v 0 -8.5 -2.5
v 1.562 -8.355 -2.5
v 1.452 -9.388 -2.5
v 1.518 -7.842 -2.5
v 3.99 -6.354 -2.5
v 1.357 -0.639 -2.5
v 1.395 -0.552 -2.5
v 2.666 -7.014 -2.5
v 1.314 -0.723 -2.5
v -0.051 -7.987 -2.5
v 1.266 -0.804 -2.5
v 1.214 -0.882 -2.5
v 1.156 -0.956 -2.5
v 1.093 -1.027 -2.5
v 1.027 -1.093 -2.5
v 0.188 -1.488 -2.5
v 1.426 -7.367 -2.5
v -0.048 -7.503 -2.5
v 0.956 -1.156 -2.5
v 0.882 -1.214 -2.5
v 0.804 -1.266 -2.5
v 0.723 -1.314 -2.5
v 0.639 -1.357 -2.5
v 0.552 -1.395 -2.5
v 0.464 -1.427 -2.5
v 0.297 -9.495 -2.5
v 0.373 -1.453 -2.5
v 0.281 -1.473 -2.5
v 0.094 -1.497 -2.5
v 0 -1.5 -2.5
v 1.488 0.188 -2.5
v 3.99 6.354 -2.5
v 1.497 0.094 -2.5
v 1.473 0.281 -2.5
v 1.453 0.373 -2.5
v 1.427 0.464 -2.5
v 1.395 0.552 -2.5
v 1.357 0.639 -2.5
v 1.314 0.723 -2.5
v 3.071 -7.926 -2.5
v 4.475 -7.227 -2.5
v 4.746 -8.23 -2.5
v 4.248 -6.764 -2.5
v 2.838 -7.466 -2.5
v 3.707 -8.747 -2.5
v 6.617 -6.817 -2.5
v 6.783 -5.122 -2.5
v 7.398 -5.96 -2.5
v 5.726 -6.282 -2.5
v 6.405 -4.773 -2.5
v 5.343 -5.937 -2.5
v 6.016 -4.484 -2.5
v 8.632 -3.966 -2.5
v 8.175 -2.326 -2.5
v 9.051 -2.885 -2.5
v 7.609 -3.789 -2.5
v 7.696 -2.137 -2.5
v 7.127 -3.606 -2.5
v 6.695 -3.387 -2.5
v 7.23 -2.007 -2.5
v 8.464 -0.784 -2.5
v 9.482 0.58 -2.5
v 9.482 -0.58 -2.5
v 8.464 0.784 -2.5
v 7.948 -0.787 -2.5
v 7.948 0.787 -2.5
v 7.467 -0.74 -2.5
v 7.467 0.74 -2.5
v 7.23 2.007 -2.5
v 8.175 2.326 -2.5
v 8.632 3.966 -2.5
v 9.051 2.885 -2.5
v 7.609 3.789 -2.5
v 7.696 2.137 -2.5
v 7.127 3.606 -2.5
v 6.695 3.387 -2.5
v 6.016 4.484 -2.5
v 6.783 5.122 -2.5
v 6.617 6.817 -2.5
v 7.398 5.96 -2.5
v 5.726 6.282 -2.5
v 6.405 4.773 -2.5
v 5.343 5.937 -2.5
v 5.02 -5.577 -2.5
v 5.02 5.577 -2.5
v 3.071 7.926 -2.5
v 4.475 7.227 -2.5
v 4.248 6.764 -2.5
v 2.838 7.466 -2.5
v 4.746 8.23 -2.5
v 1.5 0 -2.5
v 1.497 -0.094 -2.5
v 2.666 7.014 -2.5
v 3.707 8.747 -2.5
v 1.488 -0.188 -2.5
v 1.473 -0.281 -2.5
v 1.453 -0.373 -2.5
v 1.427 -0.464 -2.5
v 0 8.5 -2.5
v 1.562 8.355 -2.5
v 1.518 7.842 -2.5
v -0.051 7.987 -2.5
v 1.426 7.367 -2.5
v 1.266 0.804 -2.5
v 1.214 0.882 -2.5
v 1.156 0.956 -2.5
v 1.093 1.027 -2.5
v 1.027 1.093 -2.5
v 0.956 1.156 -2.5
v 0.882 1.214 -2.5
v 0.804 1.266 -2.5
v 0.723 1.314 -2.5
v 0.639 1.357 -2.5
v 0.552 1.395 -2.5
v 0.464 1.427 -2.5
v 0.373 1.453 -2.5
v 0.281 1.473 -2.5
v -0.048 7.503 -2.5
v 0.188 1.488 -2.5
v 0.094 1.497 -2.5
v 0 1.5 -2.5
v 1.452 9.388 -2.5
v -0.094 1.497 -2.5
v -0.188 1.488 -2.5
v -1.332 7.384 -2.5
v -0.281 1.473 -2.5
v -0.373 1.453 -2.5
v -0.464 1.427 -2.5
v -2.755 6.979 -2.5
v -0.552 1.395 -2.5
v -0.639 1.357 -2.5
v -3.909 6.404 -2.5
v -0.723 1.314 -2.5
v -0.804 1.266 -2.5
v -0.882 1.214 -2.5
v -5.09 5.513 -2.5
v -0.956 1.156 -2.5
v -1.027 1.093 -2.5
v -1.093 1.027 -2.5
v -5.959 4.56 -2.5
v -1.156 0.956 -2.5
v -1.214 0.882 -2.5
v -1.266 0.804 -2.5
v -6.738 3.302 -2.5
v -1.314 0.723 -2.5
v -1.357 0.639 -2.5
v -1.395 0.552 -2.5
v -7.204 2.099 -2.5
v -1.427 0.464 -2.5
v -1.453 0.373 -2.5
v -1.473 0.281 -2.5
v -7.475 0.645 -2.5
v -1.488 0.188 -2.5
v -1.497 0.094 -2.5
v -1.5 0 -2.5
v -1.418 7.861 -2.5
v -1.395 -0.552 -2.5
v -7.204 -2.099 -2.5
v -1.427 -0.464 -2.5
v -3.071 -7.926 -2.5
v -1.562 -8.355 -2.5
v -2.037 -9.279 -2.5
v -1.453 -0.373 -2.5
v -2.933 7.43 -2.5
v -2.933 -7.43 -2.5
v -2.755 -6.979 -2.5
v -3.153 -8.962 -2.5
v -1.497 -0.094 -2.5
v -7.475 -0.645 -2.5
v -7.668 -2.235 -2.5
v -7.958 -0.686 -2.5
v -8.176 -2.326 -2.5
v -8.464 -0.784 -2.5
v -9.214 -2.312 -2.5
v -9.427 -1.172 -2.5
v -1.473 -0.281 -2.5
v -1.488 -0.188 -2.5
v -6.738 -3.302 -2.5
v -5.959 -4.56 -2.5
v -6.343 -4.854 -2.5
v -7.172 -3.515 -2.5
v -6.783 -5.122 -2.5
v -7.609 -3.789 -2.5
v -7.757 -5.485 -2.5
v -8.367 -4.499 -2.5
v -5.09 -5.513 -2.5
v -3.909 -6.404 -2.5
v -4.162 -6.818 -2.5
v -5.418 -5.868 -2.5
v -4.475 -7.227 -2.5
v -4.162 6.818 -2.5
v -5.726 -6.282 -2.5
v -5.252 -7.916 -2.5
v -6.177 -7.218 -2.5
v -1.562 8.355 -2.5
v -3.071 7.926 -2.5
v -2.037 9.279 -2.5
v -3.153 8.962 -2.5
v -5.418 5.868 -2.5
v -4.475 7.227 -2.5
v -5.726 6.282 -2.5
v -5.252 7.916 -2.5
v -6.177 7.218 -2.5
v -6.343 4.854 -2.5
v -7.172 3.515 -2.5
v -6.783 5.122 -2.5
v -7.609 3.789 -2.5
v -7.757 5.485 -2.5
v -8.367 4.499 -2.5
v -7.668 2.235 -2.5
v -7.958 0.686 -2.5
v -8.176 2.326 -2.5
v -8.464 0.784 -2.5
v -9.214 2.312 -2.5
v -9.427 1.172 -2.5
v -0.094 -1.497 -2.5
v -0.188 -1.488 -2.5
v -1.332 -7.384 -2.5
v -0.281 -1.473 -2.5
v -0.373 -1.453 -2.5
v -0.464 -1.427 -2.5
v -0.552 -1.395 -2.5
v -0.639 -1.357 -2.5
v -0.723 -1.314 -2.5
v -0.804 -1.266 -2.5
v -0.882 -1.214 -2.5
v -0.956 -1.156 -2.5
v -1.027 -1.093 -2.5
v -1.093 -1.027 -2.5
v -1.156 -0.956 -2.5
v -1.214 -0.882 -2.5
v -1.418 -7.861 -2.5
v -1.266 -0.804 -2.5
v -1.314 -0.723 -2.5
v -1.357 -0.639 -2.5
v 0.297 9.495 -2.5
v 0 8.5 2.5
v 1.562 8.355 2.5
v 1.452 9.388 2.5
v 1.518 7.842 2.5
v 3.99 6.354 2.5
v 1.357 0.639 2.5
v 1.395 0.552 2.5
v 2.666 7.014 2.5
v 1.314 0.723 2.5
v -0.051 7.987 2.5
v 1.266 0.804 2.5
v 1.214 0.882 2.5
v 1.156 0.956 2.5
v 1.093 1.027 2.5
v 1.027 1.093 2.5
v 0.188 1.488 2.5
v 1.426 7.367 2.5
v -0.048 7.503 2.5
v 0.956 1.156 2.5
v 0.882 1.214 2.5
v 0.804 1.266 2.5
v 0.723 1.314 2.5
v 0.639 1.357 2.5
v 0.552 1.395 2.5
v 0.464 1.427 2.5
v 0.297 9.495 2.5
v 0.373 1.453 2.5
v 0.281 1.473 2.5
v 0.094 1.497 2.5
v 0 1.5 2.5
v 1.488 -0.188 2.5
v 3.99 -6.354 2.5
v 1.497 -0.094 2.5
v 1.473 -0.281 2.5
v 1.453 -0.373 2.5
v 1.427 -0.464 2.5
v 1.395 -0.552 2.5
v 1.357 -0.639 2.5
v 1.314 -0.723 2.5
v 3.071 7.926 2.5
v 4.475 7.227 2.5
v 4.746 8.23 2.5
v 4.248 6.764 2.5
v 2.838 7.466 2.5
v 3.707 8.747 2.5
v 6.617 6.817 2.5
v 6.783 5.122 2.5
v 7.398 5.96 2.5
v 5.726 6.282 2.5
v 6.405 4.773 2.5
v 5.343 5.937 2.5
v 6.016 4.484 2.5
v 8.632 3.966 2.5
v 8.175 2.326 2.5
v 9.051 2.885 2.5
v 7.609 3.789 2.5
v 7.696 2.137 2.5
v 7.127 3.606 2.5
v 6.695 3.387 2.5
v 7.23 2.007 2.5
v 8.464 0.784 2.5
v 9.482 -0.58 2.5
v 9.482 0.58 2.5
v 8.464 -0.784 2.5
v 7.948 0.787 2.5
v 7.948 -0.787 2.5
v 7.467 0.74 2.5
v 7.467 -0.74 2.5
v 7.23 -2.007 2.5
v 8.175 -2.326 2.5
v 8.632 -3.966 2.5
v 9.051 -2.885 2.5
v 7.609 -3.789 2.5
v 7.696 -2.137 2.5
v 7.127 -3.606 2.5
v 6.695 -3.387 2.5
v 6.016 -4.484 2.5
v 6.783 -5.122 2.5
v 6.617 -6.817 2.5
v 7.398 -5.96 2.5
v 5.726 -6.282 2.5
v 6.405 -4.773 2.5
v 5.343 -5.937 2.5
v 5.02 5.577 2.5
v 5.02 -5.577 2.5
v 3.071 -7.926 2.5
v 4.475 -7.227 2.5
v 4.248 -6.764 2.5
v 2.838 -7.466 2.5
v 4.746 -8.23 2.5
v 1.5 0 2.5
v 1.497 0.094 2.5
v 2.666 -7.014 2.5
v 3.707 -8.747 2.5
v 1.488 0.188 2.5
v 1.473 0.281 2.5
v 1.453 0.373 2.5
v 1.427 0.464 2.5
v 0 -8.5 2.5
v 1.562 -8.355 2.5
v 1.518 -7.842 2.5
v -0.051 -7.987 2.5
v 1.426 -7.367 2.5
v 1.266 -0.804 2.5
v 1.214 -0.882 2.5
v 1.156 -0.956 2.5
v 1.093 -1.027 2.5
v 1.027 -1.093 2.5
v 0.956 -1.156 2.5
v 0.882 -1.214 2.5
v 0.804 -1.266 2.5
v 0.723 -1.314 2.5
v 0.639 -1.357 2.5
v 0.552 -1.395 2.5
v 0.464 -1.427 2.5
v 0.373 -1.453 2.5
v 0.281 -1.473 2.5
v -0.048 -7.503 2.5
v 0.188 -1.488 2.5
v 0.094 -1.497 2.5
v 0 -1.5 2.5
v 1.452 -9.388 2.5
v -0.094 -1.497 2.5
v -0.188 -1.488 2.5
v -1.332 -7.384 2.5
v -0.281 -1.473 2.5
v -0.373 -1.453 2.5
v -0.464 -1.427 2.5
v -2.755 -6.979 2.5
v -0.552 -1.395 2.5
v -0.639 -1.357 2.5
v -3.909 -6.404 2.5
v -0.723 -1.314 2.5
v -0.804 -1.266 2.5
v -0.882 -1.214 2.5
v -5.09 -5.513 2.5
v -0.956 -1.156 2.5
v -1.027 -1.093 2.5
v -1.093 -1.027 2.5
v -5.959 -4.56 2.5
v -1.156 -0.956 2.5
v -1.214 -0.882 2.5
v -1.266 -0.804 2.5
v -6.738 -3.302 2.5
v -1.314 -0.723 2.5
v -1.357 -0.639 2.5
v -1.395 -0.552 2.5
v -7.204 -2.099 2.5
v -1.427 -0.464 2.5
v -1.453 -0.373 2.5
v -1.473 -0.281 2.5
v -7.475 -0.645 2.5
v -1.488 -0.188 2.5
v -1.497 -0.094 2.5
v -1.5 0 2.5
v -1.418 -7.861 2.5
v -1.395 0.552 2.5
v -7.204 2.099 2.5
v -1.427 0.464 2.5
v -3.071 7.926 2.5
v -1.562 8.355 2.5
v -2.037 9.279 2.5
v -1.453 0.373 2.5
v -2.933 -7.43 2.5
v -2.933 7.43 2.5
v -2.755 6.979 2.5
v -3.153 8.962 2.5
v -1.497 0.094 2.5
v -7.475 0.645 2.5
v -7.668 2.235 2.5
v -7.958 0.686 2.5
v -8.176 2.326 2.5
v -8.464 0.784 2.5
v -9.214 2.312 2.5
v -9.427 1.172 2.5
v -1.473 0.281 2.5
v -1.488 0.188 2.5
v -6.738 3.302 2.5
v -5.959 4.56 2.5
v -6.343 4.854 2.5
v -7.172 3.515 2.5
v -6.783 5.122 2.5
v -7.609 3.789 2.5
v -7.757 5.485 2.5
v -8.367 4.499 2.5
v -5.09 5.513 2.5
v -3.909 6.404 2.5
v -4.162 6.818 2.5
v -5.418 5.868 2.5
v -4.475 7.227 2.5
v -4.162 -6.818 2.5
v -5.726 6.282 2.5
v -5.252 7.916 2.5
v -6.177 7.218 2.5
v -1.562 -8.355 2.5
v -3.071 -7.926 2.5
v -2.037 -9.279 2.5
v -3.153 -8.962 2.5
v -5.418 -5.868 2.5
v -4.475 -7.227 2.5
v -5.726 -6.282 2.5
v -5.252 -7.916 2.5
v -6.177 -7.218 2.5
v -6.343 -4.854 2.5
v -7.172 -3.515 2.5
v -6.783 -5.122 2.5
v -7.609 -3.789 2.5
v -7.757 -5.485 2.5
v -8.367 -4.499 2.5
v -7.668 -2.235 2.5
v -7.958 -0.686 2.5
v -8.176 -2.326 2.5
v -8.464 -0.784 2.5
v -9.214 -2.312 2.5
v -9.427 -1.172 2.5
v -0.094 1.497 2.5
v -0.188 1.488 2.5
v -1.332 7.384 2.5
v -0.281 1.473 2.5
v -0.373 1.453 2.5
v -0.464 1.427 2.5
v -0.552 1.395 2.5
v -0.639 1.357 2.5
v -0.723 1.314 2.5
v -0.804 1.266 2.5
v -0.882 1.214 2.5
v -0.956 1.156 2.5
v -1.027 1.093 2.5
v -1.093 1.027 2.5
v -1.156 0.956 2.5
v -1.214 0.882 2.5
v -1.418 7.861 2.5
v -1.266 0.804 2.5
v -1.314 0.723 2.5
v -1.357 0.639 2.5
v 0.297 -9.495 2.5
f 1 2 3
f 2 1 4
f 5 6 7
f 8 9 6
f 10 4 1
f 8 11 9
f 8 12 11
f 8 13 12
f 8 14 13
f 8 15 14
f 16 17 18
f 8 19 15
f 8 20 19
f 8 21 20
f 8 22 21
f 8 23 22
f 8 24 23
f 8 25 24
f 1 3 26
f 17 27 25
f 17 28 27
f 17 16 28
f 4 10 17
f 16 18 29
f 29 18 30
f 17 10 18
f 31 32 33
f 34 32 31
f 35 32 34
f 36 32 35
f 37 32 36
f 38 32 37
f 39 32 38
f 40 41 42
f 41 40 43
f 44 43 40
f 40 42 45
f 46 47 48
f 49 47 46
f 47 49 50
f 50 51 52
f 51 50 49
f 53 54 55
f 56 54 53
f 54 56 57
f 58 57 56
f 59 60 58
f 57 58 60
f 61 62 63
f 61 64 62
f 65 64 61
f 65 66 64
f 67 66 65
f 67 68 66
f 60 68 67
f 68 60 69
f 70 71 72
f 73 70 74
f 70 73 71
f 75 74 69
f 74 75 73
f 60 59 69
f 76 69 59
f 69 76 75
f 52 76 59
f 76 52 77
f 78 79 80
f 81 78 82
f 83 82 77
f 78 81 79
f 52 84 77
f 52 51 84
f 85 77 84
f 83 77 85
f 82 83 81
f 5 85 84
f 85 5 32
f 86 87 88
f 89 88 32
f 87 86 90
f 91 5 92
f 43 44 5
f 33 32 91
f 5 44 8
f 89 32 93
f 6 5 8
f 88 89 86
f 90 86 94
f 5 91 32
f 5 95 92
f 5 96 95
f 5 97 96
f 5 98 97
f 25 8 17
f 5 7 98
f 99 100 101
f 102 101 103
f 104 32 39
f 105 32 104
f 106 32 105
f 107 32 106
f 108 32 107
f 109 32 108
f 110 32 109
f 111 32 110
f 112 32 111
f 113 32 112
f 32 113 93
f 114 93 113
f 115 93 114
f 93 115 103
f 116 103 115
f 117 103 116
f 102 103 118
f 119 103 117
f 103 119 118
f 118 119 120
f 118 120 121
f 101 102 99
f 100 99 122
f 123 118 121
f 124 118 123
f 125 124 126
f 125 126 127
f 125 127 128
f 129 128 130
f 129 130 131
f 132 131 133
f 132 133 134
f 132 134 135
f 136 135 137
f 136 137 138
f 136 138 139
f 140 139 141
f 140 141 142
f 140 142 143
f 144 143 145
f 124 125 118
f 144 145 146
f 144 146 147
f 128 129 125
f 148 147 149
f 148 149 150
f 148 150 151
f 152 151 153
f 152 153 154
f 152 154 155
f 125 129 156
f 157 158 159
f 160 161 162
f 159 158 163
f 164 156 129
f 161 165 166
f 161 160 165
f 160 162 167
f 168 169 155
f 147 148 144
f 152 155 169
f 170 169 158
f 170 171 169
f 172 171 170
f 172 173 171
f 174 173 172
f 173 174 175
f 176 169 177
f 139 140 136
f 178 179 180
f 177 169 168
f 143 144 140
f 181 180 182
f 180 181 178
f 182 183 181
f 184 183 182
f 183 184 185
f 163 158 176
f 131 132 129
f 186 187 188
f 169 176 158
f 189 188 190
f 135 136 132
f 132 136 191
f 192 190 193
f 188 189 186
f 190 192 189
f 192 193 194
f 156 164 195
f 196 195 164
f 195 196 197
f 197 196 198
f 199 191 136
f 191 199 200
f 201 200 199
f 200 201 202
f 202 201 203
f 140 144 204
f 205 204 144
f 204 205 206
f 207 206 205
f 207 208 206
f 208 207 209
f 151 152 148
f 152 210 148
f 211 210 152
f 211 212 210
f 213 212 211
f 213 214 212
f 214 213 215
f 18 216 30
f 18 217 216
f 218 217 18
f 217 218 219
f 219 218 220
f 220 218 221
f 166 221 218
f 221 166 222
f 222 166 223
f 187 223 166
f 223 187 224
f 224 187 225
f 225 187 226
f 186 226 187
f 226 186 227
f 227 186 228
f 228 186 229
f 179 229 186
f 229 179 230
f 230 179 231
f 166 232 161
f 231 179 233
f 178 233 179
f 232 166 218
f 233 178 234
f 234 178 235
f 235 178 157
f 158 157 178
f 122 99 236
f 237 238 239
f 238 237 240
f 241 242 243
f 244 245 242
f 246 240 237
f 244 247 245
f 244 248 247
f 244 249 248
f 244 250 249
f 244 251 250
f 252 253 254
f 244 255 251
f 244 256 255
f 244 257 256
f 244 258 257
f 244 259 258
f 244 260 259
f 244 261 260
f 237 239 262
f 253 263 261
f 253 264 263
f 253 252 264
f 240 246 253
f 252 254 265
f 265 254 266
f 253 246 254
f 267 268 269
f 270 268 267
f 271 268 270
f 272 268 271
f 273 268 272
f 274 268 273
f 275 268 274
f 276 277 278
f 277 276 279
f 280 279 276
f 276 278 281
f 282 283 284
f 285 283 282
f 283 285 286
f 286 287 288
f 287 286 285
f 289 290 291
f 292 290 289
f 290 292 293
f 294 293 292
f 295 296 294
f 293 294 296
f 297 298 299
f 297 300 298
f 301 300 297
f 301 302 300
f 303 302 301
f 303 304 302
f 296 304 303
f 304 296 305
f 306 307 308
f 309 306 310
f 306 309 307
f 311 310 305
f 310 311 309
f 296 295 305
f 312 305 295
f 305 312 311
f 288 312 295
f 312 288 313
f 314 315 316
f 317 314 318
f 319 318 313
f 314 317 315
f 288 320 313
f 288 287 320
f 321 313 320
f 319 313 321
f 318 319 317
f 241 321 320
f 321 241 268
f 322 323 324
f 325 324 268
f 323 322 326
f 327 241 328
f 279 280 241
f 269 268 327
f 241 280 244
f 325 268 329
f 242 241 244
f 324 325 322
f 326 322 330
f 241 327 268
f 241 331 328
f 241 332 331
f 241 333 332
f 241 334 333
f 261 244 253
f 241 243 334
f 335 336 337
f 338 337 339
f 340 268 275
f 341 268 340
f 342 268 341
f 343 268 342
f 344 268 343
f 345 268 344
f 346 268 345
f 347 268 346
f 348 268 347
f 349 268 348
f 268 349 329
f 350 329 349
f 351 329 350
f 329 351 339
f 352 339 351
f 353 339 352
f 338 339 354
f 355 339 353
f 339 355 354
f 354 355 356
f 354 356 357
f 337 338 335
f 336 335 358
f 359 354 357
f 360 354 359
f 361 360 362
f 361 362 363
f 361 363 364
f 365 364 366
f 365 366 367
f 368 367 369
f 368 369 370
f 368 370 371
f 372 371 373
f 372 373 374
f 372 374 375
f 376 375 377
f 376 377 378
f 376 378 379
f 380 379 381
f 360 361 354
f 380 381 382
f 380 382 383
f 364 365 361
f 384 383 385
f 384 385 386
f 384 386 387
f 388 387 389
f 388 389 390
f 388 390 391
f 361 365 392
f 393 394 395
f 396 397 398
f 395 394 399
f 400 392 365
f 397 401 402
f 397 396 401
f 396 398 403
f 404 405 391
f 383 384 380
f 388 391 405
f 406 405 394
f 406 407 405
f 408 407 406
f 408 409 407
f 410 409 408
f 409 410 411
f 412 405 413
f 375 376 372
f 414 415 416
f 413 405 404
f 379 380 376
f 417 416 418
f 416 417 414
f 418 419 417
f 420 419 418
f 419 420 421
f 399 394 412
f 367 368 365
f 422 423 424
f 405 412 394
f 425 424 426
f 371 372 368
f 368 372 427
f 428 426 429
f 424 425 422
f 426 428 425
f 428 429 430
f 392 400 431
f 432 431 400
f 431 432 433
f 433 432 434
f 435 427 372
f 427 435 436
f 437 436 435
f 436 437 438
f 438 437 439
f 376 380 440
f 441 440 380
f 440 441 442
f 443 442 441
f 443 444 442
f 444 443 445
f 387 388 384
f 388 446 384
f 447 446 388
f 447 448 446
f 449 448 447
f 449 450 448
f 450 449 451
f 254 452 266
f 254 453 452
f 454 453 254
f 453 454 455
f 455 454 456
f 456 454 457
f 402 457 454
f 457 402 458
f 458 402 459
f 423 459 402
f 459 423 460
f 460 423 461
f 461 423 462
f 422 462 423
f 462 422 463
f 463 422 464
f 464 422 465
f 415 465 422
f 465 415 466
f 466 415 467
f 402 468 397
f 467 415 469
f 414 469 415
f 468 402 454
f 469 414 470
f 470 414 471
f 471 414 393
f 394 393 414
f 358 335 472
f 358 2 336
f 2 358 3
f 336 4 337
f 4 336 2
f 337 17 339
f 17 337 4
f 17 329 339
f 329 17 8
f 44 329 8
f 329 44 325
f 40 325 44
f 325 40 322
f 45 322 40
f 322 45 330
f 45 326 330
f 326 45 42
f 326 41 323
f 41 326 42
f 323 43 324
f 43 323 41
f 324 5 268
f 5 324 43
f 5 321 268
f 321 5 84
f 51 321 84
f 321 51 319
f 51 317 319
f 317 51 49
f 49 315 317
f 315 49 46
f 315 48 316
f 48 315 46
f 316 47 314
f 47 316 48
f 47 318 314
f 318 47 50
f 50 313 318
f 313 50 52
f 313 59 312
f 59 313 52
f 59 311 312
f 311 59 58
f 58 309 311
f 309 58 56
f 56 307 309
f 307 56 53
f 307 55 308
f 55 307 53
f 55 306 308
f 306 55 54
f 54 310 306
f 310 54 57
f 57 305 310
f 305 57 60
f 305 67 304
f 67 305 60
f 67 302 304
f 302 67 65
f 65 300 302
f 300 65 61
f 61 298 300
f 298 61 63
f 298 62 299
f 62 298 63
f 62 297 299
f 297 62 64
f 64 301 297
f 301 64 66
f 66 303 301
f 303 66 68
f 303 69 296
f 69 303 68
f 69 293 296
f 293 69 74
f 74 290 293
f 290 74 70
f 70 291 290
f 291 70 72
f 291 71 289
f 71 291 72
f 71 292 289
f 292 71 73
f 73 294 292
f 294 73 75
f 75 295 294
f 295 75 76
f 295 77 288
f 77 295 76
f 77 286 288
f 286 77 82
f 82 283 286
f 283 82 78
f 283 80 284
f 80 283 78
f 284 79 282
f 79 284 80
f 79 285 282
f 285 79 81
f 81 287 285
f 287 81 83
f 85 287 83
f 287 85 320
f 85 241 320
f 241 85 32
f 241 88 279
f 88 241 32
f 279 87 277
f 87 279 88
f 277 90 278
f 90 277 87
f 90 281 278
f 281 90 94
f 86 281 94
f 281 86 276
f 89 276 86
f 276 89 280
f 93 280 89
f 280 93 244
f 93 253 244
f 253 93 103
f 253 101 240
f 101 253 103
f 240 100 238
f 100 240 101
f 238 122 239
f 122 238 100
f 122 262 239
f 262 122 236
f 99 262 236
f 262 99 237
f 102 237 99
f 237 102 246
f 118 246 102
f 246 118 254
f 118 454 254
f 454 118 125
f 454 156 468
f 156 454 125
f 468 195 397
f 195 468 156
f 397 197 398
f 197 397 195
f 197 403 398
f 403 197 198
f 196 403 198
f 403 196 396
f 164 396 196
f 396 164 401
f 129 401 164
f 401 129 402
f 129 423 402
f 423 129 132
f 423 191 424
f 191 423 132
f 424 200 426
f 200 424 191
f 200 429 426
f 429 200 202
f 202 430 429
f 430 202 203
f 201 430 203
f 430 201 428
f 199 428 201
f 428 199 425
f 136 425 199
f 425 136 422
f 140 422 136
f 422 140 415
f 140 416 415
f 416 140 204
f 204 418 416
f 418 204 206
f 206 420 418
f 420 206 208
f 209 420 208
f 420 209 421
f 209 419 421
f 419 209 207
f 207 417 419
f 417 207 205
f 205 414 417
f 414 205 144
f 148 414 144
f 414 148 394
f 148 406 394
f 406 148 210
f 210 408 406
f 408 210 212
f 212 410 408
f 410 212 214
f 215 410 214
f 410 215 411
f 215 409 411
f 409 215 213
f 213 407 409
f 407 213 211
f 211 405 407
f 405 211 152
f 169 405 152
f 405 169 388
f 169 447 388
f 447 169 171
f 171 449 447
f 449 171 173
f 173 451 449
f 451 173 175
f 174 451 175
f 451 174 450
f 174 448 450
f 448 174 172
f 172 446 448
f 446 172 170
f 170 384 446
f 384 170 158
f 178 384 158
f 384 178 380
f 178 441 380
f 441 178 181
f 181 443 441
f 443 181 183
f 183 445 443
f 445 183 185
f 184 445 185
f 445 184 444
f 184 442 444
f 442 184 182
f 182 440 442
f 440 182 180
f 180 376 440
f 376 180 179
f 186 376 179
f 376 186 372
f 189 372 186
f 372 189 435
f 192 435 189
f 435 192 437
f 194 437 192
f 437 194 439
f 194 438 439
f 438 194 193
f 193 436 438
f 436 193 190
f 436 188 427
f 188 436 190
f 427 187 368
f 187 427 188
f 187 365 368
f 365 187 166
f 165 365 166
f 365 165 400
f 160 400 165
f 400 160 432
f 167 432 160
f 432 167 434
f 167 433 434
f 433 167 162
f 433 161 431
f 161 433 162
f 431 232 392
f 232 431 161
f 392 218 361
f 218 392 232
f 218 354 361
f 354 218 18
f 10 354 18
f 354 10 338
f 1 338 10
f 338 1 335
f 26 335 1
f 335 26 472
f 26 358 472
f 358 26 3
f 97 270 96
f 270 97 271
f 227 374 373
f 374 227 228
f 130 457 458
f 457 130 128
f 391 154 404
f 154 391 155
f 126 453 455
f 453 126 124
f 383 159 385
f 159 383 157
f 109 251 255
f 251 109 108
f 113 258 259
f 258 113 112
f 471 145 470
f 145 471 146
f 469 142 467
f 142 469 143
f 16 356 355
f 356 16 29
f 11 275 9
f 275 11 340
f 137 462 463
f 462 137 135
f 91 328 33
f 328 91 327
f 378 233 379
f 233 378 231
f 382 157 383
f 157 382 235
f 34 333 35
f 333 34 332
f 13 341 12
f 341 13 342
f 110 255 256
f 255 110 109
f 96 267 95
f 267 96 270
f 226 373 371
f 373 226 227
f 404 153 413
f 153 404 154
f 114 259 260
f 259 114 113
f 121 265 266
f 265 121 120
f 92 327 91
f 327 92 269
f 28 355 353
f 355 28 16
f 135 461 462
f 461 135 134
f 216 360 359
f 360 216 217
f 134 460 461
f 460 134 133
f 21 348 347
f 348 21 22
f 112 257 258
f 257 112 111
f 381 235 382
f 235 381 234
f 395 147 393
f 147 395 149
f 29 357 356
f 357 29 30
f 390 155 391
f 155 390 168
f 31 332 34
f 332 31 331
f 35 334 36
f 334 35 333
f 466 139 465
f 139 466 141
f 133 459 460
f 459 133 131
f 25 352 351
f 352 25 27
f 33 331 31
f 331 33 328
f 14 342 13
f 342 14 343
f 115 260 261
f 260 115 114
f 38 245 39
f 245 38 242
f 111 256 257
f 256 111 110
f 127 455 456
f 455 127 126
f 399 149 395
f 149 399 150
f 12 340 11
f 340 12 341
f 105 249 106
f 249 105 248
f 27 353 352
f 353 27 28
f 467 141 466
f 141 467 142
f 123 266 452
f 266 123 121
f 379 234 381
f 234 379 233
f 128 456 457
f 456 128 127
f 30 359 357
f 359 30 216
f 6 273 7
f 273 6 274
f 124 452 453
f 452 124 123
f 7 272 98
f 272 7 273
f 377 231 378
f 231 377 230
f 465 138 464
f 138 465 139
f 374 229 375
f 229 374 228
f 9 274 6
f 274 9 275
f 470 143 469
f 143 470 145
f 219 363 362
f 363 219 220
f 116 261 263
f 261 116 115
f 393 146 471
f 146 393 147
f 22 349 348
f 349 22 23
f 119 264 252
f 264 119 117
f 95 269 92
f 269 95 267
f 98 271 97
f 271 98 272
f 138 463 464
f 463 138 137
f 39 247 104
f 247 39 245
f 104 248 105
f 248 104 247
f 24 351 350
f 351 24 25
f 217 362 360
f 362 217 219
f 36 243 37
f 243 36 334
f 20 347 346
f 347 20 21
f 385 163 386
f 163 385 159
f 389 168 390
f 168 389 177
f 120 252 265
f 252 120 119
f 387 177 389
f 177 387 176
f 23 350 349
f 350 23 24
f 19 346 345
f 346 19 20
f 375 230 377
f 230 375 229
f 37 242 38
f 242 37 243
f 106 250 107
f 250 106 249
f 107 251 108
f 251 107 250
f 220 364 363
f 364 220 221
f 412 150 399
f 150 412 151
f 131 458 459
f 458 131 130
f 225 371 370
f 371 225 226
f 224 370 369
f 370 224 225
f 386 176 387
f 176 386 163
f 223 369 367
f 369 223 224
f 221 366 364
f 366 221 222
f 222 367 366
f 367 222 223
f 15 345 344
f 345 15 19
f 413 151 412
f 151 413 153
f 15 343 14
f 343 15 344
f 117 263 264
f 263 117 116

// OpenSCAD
// [FL_INDEX: keywords="openscad, 3d_parametric, Gear_Generator_For_Customizer_V1_0___outdated, csg_solid" | COT="Parametric OpenSCAD design from 3DCodeverse"]
// Title: Gear Generator For Customizer V1.0 **outdated**

height = 5;
type = "Spur"; // [Spur,Cog,Double Helix(beta), Single Helix]
teeth = 17;	//	[5:56]
scale = 100;//[3:100]
hole = "Yes"; //[Yes,No]
//don't make too big or your gear will disappear
holeSize = 1.5;
if (type == "Spur")
{
if(hole == "Yes")
{
hole();
}
else
{
spur();
}
}
else if(type == "Cog")
{
if(hole == "Yes")
{
hole();
}
else
{
cog();
}
}
else if(type == "Double Helix(beta)")
{
if(hole == "Yes")
{
hole();
}
else
{
double_helix();
}
}
else if (type == "Single Helix")
{
if(hole == "Yes")
{
hole();
}
else
{
single_helix();
}
}


module gear(number_of_teeth,
		circular_pitch=false, diametral_pitch=false,
		pressure_angle=20, clearance = 0)
{

	//Convert diametrial pitch to our native circular pitch
	circular_pitch = (circular_pitch!=false?circular_pitch:180/diametral_pitch);

	// Pitch diameter: Diameter of pitch circle.
	pitch_diameter  =  number_of_teeth * circular_pitch / 180;
	pitch_radius = pitch_diameter/2;

	// Base Circle
	base_diameter = pitch_diameter*cos(pressure_angle);
	base_radius = base_diameter/2;

	// Diametrial pitch: Number of teeth per unit length.
	pitch_diametrial = number_of_teeth / pitch_diameter;

	// Addendum: Radial distance from pitch circle to outside circle.
	addendum = 1/pitch_diametrial;

	//Outer Circle
	outer_radius = pitch_radius+addendum;
	outer_diameter = outer_radius*2;

	// Dedendum: Radial distance from pitch circle to root diameter
	dedendum = addendum + clearance;

	// Root diameter: Diameter of bottom of tooth spaces.
	root_radius = pitch_radius-dedendum;
	root_diameter = root_radius * 2;

	half_thick_angle = 360 / (4 * number_of_teeth);

	union()
	{
		rotate(half_thick_angle) circle($fn=number_of_teeth*2, r=root_radius*1.001);

		for (i= [1:number_of_teeth])
		//for (i = [0])
		{
			rotate([0,0,i*360/number_of_teeth])
			{
				involute_gear_tooth(
					pitch_radius = pitch_radius,
					root_radius = root_radius,
					base_radius = base_radius,
					outer_radius = outer_radius,
					half_thick_angle = half_thick_angle);
			}
		}
	}
}


module involute_gear_tooth(
					pitch_radius,
					root_radius,
					base_radius,
					outer_radius,
					half_thick_angle
					)
{
	pitch_to_base_angle  = involute_intersect_angle( base_radius, pitch_radius );

	outer_to_base_angle = involute_intersect_angle( base_radius/2, outer_radius*1);

	base1 = 0 - pitch_to_base_angle - half_thick_angle;
	pitch1 = 0 - half_thick_angle;
	outer1 = outer_to_base_angle - pitch_to_base_angle - half_thick_angle;

	b1 = polar_to_cartesian([ base1, base_radius ]);
	p1 = polar_to_cartesian([ pitch1, pitch_radius ]);
	o1 = polar_to_cartesian([ outer1, outer_radius ]);

	b2 = polar_to_cartesian([ -base1, base_radius ]);
	p2 = polar_to_cartesian([ -pitch1, pitch_radius ]);
	o2 = polar_to_cartesian([ -outer1, outer_radius ]);

	// ( root_radius > base_radius variables )
		pitch_to_root_angle = pitch_to_base_angle - involute_intersect_angle(base_radius, root_radius );
		root1 = pitch1 - pitch_to_root_angle;
		root2 = -pitch1 + pitch_to_root_angle;
		r1_t =  polar_to_cartesian([ root1, root_radius ]);
		r2_t =  polar_to_cartesian([ -root1, root_radius ]);

	// ( else )
		r1_f =  polar_to_cartesian([ base1, root_radius ]);
		r2_f =  polar_to_cartesian([ -base1, root_radius ]);

	if (root_radius > base_radius)
	{
		//echo("true");
		polygon( points = [
			r1_t,p1,o1,o2,p2,r2_t
		], convexity = 3);
	}
	else
	{
		polygon( points = [
			r1_f, b1,p1,o1,o2,p2,b2,r2_f
		], convexity = 3);
	}

}

// Mathematical Functions
//===============

// Finds the angle of the involute about the base radius at the given distance (radius) from it's center.
//source: http://www.mathhelpforum.com/math-help/geometry/136011-circle-involute-solving-y-any-given-x.html

function involute_intersect_angle(base_radius, radius) = sqrt( pow(radius/base_radius,2) - 1);



// Polar coord [angle, radius] to cartesian coord [x,y]

function polar_to_cartesian(polar) = [
	polar[1]*cos(polar[0]),
	polar[1]*sin(polar[0])
];


// Test Cases
//===============

module test_gears()
{
	gear(number_of_teeth=51,circular_pitch=200);
	translate([0, 50])gear(number_of_teeth=17,circular_pitch=200);
	translate([-50,0]) gear(number_of_teeth=17,diametral_pitch=1);
}
module cog()
{
		gear(number_of_teeth=teeth,diametral_pitch=scale/100);

}
module single_helix()
{
	translate([50,0]);
	{
	linear_extrude(height = height, center = true, convexity = 10, twist = -45)
	 gear(number_of_teeth=teeth,diametral_pitch=scale/100);
	}
}
module double_helix()
{



linear_extrude(height = height, center = true, convexity = 10, twist = -45)
	 gear(number_of_teeth=teeth,diametral_pitch=scale/100);
	translate([0,0,height]) linear_extrude(height = height, center = true, convexity = 10, twist = 45)
	 gear(number_of_teeth=teeth,diametral_pitch=scale/100);

}
module spur()
{

		translate([0,0]) linear_extrude(height = height, center = true, convexity = 10, twist = 0)
	 gear(number_of_teeth=teeth,diametral_pitch=1);


}

module demo_3d_gears()
{
	//double helical gear
	// (helics don't line up perfectly - for display purposes only ;)
	translate([50,0])
	{
	linear_extrude(height = 10, center = true, convexity = 10, twist = -45)
	 gear(number_of_teeth=17,diametral_pitch=1);
	translate([0,0,10]) linear_extrude(height = height, center = true, convexity = 10, twist = 45)
	 gear(number_of_teeth=17,diametral_pitch=1);
	}

	//spur gear
	translate([0,-50]) linear_extrude(height = height, center = true, convexity = 10, twist = 0)
	 gear(number_of_teeth=17,diametral_pitch=1);

}
module hole() {
   difference() {
if(type == "Spur")
{
translate([0,0]) linear_extrude(height = height, center = true, convexity = 10, twist = 0)
	 gear(number_of_teeth=teeth,diametral_pitch=1);
}
else if(type == "Cog")
{
gear(number_of_teeth=teeth,diametral_pitch=scale/100);
}
else if (type == "Double Helix(beta)")
{
linear_extrude(height = height, center = true, convexity = 10, twist = -45)
	 gear(number_of_teeth=teeth,diametral_pitch=scale/100);
	translate([0,0,height]) linear_extrude(height = height, center = true, convexity = 10, twist = 45)
	 gear(number_of_teeth=teeth,diametral_pitch=scale/100);
}
else if (type == "Single Helix")
{
linear_extrude(height = height, center = true, convexity = 10, twist = -45)
	 gear(number_of_teeth=teeth,diametral_pitch=scale/100);
}
# rotate ([0,0,0]) cylinder (h = height*4, r=holeSize, center = true, $fn=100);
}
}




module test_involute_curve()
{
	for (i=[0,1,2,3,4,5,6,7,8,9,10,11,12,13,14,15])
	{
		translate(polar_to_cartesian([involute_intersect_angle( 0.1,i) , i ])) circle($fn=15, r=0.5);
	}
}
